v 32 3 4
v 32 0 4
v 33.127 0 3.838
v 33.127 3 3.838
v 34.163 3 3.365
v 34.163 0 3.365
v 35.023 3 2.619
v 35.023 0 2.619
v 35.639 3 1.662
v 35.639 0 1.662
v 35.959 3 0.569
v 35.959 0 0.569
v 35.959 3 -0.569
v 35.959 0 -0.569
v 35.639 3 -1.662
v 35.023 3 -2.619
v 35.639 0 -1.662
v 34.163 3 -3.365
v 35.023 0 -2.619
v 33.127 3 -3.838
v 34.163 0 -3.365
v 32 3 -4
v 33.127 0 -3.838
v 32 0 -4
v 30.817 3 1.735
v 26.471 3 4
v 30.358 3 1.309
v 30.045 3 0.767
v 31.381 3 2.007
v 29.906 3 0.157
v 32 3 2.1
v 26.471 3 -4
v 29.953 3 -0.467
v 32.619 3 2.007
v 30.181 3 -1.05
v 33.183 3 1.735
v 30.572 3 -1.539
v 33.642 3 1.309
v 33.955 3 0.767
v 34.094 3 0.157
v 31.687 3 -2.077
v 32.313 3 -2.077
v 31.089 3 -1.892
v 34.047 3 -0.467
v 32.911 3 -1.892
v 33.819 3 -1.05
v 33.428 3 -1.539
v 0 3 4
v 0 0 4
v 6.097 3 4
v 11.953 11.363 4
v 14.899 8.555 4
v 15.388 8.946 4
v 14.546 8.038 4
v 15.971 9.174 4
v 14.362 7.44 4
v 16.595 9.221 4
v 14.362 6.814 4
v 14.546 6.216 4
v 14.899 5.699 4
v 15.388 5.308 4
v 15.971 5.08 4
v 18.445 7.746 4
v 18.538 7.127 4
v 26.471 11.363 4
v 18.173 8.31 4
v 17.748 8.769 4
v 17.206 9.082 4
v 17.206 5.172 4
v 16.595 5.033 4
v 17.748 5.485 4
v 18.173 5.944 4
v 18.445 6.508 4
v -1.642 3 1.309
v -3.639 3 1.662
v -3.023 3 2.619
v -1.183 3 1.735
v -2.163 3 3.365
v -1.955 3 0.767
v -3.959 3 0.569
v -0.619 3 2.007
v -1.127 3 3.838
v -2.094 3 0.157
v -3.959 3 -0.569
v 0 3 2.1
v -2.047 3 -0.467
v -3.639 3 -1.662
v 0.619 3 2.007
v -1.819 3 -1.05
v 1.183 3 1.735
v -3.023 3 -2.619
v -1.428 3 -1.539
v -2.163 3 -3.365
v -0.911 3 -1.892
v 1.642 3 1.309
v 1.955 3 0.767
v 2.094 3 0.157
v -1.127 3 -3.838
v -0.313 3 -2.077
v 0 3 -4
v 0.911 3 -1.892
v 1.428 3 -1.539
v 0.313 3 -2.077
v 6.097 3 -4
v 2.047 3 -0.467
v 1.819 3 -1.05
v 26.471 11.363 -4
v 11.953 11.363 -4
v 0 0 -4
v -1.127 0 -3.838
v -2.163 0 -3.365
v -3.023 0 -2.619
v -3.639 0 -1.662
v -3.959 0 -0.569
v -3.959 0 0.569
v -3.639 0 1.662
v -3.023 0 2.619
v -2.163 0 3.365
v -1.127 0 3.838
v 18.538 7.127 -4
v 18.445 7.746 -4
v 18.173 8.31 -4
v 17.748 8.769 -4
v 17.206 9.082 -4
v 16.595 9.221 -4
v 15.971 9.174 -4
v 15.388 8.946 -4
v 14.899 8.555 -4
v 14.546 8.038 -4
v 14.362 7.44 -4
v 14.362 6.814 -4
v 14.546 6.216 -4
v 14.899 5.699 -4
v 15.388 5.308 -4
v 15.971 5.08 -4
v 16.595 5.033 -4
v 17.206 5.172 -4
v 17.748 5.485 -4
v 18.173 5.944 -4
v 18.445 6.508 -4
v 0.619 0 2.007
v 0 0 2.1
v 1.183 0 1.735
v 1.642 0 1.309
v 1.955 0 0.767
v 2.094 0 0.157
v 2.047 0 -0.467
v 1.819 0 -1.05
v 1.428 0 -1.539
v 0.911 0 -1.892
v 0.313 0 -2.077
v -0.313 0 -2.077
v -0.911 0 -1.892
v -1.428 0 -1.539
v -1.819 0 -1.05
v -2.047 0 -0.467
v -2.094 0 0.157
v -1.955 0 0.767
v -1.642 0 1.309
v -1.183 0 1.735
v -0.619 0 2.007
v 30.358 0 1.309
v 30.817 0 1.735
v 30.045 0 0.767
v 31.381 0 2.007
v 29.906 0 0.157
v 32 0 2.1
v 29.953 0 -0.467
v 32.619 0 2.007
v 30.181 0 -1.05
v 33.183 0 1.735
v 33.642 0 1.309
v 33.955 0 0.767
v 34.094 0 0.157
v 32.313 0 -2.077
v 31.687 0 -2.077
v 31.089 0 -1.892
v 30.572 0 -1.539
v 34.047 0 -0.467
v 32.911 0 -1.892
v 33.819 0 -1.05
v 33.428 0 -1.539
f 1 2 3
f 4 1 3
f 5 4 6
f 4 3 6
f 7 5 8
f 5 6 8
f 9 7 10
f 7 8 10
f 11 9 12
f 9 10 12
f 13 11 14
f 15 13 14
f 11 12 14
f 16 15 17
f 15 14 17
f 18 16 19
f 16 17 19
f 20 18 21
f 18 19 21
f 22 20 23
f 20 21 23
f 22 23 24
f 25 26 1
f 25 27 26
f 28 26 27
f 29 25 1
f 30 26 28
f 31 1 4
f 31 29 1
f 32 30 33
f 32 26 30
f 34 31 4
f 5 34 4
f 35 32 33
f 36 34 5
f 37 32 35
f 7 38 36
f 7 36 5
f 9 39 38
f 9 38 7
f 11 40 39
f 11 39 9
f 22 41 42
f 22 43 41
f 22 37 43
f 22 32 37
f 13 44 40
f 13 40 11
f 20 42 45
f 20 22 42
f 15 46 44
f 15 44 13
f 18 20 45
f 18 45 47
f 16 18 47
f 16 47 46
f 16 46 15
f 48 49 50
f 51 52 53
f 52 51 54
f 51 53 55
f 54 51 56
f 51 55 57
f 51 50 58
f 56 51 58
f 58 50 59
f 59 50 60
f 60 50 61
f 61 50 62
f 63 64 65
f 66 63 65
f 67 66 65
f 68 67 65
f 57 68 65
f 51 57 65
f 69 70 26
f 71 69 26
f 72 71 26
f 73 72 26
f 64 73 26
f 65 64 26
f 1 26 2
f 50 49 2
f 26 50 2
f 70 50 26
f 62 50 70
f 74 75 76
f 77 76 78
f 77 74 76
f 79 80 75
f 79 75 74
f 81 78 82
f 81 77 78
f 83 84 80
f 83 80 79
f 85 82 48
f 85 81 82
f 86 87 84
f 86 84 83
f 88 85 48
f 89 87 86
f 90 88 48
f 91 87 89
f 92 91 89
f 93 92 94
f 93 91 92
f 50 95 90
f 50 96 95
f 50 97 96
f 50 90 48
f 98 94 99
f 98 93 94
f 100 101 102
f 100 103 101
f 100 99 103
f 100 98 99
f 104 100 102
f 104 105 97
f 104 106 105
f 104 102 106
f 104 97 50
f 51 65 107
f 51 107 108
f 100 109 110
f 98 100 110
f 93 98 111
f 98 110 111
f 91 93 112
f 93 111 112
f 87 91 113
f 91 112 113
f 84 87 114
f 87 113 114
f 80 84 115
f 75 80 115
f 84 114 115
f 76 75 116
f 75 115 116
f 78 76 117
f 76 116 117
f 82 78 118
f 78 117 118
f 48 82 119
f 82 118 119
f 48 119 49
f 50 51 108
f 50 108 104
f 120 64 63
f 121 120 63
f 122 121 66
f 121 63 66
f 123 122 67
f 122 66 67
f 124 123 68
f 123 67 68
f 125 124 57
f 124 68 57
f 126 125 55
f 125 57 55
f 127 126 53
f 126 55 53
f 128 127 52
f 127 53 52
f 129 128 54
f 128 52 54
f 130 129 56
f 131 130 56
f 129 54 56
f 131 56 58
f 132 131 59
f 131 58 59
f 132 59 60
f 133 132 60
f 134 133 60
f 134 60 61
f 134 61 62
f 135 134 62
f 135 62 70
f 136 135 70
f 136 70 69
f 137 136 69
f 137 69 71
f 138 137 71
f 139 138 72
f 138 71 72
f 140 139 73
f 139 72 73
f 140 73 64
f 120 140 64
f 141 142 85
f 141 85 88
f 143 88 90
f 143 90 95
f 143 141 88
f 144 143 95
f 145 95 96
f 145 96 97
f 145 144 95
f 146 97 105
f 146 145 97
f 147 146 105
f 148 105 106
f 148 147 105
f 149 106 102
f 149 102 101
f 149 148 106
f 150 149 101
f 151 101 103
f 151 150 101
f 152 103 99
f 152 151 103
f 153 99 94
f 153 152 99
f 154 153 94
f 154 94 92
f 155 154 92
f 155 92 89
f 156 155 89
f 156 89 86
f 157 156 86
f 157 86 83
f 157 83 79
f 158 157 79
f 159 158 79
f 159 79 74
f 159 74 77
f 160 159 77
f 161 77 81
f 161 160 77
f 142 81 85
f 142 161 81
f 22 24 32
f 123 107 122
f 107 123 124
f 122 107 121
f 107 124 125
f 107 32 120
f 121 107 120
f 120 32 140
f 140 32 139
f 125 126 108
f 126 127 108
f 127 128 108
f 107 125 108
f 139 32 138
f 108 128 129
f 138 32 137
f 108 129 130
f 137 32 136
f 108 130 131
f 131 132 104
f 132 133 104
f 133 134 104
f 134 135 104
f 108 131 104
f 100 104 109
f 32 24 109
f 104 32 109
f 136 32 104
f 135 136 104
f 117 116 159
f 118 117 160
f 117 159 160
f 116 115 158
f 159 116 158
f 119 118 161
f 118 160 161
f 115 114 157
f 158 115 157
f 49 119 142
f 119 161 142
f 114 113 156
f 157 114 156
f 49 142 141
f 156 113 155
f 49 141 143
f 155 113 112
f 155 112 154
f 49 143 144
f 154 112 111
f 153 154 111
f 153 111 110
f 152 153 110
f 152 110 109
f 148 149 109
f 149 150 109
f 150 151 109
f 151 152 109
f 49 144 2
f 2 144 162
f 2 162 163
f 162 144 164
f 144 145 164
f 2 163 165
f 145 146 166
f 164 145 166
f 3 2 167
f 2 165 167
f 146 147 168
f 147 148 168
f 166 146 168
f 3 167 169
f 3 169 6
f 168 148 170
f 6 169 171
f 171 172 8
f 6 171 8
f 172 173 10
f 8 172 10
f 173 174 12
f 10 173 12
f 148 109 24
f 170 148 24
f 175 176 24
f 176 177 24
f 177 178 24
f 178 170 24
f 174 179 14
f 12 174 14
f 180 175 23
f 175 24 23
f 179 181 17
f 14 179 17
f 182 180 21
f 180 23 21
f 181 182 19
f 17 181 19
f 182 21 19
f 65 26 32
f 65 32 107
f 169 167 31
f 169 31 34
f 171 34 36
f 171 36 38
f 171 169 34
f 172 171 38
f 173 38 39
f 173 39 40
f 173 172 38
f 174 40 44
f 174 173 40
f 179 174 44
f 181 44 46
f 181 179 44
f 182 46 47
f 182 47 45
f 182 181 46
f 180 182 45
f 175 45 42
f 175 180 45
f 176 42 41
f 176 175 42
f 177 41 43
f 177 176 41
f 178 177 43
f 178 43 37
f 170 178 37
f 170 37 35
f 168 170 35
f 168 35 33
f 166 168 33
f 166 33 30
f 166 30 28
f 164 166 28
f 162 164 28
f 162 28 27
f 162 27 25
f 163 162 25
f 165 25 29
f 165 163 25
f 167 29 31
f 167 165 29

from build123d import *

# Parameters (mm, degrees)
SKETCH1_R           = 2.1
BOSS_EXTRUDE1_DEPTH = 3
SKETCH2_R           = 2.1
BOSS_EXTRUDE2_DEPTH = 8


with BuildPart() as part:
    # Sketch1 → Boss-Extrude1 (new body)
    with BuildSketch(Plane(origin=(0, 0, 0), x_dir=(1, 0, 0), z_dir=(0, 1, 0))):
        with BuildLine():
            Line((0, -4), (32, -4))
            ThreePointArc((32, -4), (36, 0), (32, 4))
            Line((32, 4), (0, 4))
            ThreePointArc((0, 4), (-4, 0), (0, -4))
        make_face()
        with Locations(Location((0, 0, 0), (0, 0, 270))):
            Circle(SKETCH1_R, mode=Mode.SUBTRACT)
        with Locations(Location((32, 0, 0), (0, 0, 270))):
            Circle(SKETCH1_R, mode=Mode.SUBTRACT)
    extrude(amount=BOSS_EXTRUDE1_DEPTH)

    # Sketch2 → Boss-Extrude2 (add)
    with BuildSketch(Plane.XY.offset(4)):
        Polygon((26.470573602, 11.363168568), (11.952968187, 11.363168568), (6.097014513, 3), (20.614619928, 3), (26.470573602, 3), align=None)
        with Locations((16.438382798, 7.127099025)):
            Circle(SKETCH2_R, mode=Mode.SUBTRACT)
    extrude(amount=-BOSS_EXTRUDE2_DEPTH)


solid = part.part
